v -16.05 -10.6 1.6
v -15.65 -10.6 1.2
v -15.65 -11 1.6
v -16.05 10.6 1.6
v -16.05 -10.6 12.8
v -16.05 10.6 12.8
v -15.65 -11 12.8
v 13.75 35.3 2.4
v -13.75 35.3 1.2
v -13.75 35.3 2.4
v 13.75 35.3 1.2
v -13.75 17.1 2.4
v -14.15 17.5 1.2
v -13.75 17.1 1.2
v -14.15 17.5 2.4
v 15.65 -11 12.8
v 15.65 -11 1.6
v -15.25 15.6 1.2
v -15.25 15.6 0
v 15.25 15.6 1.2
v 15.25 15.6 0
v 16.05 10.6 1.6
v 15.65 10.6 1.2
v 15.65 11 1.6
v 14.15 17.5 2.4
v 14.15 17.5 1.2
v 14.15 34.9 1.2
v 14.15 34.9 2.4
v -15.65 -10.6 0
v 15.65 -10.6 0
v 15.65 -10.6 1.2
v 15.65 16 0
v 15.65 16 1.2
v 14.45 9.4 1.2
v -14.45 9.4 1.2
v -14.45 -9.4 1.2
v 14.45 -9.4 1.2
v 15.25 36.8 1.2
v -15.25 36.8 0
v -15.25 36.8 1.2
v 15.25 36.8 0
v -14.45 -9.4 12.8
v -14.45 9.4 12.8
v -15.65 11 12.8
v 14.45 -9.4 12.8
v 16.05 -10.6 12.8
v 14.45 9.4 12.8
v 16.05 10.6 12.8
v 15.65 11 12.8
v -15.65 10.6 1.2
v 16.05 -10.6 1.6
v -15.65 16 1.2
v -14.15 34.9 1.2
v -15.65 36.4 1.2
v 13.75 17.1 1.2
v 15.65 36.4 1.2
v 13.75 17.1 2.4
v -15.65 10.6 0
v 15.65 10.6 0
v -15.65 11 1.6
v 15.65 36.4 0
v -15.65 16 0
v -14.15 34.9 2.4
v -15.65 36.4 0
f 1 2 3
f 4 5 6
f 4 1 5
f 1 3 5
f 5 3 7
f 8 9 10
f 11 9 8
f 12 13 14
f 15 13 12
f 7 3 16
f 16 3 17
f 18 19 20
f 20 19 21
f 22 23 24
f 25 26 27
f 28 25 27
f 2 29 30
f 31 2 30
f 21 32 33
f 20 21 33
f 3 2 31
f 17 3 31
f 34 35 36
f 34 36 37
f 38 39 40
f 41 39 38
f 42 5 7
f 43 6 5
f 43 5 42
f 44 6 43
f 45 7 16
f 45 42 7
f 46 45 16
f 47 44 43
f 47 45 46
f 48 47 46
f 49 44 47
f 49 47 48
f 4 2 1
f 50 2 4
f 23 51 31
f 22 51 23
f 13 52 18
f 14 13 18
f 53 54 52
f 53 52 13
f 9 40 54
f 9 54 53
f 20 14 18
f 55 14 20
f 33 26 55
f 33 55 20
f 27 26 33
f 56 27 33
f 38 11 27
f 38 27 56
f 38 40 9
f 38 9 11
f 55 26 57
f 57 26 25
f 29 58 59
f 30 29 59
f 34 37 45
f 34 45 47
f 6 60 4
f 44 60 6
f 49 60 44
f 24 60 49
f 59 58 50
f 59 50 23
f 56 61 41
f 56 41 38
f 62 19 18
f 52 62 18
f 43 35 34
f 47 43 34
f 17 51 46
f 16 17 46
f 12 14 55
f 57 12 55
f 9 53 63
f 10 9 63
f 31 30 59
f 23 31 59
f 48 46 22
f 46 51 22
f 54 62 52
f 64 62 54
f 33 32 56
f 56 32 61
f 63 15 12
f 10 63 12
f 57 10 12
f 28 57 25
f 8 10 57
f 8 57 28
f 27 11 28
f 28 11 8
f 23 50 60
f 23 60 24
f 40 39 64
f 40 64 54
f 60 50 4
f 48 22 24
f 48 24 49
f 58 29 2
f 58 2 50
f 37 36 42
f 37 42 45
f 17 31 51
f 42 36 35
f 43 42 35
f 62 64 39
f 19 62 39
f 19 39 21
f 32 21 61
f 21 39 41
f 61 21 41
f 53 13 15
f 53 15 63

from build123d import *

# Parameters (mm, degrees)
F0_W      = 31.3
F0_H      = 21.2
F1_DEPTH  = 1.2
F2_W      = 32.1
F2_H      = 22
F2_W_2    = 31.3
F2_H_2    = 21.2
F2_W_3    = 28.9
F2_H_3    = 18.8
F3_DEPTH  = 11.6
F4_W      = 28.3
F4_H      = 18.2
F5_DEPTH  = 1.2
F6_SIZE   = 0.39999
F6_2_SIZE = 0.39999


# Not quite as in the source:
# - a fillet or chamfer is up to 0.001 mm smaller than in the source, because OpenCascade refuses the exact size


with BuildPart() as f1:
    # F0 (on Top) → F1 (new body)
    with BuildSketch(Plane.XY):
        Rectangle(F0_W, F0_H)
    extrude(amount=F1_DEPTH)

    # F2 (on face) → F3 (join)
    with BuildSketch(Plane.XY.offset(1.2)):
        Rectangle(F2_W, F2_H)
        Rectangle(F2_W_2, F2_H_2, mode=Mode.SUBTRACT)
        Rectangle(F2_W_2, F2_H_2)
        Rectangle(F2_W_3, F2_H_3, mode=Mode.SUBTRACT)
    extrude(amount=F3_DEPTH)

    # F6 (size 0.4 in the source; OpenCascade refuses exactly that, so slightly less here)
    f6_edges = [f1.edges().sort_by_distance(p)[0] for p in [
        (-16.05, 0, 1.2),
        (0, -11, 1.2),
        (16.05, 0, 1.2),
        (0, 11, 1.2),
        (-16.05, -11, 7),
        (16.05, -11, 7),
        (16.05, 11, 7),
        (-16.05, 11, 7),
    ]]
    chamfer(f6_edges, length=F6_SIZE)


with BuildPart() as f1b:
    # F0 (on Top) → F1, piece 2 (new body)
    with BuildSketch(Plane.XY):
        with Locations((0, 26.2)):
            Rectangle(F0_W, F0_H)
    extrude(amount=F1_DEPTH)

    # F4 (on face) → F5 (join)
    with BuildSketch(Plane.XY.offset(1.2)):
        with Locations((0, 26.2)):
            Rectangle(F4_W, F4_H)
    extrude(amount=F5_DEPTH)

    # F6#2 (size 0.4 in the source; OpenCascade refuses exactly that, so slightly less here)
    f6_2_edges = [f1b.edges().sort_by_distance(p)[0] for p in [
        (15.65, 36.8, 0.6),
        (15.65, 15.6, 0.6),
        (-15.65, 36.8, 0.6),
        (-14.15, 35.3, 1.8),
        (14.15, 35.3, 1.8),
        (14.15, 17.1, 1.8),
        (-14.15, 17.1, 1.8),
        (-15.65, 15.6, 0.6),
    ]]
    chamfer(f6_2_edges, length=F6_2_SIZE)


solid = Compound([f1.part, f1b.part])
